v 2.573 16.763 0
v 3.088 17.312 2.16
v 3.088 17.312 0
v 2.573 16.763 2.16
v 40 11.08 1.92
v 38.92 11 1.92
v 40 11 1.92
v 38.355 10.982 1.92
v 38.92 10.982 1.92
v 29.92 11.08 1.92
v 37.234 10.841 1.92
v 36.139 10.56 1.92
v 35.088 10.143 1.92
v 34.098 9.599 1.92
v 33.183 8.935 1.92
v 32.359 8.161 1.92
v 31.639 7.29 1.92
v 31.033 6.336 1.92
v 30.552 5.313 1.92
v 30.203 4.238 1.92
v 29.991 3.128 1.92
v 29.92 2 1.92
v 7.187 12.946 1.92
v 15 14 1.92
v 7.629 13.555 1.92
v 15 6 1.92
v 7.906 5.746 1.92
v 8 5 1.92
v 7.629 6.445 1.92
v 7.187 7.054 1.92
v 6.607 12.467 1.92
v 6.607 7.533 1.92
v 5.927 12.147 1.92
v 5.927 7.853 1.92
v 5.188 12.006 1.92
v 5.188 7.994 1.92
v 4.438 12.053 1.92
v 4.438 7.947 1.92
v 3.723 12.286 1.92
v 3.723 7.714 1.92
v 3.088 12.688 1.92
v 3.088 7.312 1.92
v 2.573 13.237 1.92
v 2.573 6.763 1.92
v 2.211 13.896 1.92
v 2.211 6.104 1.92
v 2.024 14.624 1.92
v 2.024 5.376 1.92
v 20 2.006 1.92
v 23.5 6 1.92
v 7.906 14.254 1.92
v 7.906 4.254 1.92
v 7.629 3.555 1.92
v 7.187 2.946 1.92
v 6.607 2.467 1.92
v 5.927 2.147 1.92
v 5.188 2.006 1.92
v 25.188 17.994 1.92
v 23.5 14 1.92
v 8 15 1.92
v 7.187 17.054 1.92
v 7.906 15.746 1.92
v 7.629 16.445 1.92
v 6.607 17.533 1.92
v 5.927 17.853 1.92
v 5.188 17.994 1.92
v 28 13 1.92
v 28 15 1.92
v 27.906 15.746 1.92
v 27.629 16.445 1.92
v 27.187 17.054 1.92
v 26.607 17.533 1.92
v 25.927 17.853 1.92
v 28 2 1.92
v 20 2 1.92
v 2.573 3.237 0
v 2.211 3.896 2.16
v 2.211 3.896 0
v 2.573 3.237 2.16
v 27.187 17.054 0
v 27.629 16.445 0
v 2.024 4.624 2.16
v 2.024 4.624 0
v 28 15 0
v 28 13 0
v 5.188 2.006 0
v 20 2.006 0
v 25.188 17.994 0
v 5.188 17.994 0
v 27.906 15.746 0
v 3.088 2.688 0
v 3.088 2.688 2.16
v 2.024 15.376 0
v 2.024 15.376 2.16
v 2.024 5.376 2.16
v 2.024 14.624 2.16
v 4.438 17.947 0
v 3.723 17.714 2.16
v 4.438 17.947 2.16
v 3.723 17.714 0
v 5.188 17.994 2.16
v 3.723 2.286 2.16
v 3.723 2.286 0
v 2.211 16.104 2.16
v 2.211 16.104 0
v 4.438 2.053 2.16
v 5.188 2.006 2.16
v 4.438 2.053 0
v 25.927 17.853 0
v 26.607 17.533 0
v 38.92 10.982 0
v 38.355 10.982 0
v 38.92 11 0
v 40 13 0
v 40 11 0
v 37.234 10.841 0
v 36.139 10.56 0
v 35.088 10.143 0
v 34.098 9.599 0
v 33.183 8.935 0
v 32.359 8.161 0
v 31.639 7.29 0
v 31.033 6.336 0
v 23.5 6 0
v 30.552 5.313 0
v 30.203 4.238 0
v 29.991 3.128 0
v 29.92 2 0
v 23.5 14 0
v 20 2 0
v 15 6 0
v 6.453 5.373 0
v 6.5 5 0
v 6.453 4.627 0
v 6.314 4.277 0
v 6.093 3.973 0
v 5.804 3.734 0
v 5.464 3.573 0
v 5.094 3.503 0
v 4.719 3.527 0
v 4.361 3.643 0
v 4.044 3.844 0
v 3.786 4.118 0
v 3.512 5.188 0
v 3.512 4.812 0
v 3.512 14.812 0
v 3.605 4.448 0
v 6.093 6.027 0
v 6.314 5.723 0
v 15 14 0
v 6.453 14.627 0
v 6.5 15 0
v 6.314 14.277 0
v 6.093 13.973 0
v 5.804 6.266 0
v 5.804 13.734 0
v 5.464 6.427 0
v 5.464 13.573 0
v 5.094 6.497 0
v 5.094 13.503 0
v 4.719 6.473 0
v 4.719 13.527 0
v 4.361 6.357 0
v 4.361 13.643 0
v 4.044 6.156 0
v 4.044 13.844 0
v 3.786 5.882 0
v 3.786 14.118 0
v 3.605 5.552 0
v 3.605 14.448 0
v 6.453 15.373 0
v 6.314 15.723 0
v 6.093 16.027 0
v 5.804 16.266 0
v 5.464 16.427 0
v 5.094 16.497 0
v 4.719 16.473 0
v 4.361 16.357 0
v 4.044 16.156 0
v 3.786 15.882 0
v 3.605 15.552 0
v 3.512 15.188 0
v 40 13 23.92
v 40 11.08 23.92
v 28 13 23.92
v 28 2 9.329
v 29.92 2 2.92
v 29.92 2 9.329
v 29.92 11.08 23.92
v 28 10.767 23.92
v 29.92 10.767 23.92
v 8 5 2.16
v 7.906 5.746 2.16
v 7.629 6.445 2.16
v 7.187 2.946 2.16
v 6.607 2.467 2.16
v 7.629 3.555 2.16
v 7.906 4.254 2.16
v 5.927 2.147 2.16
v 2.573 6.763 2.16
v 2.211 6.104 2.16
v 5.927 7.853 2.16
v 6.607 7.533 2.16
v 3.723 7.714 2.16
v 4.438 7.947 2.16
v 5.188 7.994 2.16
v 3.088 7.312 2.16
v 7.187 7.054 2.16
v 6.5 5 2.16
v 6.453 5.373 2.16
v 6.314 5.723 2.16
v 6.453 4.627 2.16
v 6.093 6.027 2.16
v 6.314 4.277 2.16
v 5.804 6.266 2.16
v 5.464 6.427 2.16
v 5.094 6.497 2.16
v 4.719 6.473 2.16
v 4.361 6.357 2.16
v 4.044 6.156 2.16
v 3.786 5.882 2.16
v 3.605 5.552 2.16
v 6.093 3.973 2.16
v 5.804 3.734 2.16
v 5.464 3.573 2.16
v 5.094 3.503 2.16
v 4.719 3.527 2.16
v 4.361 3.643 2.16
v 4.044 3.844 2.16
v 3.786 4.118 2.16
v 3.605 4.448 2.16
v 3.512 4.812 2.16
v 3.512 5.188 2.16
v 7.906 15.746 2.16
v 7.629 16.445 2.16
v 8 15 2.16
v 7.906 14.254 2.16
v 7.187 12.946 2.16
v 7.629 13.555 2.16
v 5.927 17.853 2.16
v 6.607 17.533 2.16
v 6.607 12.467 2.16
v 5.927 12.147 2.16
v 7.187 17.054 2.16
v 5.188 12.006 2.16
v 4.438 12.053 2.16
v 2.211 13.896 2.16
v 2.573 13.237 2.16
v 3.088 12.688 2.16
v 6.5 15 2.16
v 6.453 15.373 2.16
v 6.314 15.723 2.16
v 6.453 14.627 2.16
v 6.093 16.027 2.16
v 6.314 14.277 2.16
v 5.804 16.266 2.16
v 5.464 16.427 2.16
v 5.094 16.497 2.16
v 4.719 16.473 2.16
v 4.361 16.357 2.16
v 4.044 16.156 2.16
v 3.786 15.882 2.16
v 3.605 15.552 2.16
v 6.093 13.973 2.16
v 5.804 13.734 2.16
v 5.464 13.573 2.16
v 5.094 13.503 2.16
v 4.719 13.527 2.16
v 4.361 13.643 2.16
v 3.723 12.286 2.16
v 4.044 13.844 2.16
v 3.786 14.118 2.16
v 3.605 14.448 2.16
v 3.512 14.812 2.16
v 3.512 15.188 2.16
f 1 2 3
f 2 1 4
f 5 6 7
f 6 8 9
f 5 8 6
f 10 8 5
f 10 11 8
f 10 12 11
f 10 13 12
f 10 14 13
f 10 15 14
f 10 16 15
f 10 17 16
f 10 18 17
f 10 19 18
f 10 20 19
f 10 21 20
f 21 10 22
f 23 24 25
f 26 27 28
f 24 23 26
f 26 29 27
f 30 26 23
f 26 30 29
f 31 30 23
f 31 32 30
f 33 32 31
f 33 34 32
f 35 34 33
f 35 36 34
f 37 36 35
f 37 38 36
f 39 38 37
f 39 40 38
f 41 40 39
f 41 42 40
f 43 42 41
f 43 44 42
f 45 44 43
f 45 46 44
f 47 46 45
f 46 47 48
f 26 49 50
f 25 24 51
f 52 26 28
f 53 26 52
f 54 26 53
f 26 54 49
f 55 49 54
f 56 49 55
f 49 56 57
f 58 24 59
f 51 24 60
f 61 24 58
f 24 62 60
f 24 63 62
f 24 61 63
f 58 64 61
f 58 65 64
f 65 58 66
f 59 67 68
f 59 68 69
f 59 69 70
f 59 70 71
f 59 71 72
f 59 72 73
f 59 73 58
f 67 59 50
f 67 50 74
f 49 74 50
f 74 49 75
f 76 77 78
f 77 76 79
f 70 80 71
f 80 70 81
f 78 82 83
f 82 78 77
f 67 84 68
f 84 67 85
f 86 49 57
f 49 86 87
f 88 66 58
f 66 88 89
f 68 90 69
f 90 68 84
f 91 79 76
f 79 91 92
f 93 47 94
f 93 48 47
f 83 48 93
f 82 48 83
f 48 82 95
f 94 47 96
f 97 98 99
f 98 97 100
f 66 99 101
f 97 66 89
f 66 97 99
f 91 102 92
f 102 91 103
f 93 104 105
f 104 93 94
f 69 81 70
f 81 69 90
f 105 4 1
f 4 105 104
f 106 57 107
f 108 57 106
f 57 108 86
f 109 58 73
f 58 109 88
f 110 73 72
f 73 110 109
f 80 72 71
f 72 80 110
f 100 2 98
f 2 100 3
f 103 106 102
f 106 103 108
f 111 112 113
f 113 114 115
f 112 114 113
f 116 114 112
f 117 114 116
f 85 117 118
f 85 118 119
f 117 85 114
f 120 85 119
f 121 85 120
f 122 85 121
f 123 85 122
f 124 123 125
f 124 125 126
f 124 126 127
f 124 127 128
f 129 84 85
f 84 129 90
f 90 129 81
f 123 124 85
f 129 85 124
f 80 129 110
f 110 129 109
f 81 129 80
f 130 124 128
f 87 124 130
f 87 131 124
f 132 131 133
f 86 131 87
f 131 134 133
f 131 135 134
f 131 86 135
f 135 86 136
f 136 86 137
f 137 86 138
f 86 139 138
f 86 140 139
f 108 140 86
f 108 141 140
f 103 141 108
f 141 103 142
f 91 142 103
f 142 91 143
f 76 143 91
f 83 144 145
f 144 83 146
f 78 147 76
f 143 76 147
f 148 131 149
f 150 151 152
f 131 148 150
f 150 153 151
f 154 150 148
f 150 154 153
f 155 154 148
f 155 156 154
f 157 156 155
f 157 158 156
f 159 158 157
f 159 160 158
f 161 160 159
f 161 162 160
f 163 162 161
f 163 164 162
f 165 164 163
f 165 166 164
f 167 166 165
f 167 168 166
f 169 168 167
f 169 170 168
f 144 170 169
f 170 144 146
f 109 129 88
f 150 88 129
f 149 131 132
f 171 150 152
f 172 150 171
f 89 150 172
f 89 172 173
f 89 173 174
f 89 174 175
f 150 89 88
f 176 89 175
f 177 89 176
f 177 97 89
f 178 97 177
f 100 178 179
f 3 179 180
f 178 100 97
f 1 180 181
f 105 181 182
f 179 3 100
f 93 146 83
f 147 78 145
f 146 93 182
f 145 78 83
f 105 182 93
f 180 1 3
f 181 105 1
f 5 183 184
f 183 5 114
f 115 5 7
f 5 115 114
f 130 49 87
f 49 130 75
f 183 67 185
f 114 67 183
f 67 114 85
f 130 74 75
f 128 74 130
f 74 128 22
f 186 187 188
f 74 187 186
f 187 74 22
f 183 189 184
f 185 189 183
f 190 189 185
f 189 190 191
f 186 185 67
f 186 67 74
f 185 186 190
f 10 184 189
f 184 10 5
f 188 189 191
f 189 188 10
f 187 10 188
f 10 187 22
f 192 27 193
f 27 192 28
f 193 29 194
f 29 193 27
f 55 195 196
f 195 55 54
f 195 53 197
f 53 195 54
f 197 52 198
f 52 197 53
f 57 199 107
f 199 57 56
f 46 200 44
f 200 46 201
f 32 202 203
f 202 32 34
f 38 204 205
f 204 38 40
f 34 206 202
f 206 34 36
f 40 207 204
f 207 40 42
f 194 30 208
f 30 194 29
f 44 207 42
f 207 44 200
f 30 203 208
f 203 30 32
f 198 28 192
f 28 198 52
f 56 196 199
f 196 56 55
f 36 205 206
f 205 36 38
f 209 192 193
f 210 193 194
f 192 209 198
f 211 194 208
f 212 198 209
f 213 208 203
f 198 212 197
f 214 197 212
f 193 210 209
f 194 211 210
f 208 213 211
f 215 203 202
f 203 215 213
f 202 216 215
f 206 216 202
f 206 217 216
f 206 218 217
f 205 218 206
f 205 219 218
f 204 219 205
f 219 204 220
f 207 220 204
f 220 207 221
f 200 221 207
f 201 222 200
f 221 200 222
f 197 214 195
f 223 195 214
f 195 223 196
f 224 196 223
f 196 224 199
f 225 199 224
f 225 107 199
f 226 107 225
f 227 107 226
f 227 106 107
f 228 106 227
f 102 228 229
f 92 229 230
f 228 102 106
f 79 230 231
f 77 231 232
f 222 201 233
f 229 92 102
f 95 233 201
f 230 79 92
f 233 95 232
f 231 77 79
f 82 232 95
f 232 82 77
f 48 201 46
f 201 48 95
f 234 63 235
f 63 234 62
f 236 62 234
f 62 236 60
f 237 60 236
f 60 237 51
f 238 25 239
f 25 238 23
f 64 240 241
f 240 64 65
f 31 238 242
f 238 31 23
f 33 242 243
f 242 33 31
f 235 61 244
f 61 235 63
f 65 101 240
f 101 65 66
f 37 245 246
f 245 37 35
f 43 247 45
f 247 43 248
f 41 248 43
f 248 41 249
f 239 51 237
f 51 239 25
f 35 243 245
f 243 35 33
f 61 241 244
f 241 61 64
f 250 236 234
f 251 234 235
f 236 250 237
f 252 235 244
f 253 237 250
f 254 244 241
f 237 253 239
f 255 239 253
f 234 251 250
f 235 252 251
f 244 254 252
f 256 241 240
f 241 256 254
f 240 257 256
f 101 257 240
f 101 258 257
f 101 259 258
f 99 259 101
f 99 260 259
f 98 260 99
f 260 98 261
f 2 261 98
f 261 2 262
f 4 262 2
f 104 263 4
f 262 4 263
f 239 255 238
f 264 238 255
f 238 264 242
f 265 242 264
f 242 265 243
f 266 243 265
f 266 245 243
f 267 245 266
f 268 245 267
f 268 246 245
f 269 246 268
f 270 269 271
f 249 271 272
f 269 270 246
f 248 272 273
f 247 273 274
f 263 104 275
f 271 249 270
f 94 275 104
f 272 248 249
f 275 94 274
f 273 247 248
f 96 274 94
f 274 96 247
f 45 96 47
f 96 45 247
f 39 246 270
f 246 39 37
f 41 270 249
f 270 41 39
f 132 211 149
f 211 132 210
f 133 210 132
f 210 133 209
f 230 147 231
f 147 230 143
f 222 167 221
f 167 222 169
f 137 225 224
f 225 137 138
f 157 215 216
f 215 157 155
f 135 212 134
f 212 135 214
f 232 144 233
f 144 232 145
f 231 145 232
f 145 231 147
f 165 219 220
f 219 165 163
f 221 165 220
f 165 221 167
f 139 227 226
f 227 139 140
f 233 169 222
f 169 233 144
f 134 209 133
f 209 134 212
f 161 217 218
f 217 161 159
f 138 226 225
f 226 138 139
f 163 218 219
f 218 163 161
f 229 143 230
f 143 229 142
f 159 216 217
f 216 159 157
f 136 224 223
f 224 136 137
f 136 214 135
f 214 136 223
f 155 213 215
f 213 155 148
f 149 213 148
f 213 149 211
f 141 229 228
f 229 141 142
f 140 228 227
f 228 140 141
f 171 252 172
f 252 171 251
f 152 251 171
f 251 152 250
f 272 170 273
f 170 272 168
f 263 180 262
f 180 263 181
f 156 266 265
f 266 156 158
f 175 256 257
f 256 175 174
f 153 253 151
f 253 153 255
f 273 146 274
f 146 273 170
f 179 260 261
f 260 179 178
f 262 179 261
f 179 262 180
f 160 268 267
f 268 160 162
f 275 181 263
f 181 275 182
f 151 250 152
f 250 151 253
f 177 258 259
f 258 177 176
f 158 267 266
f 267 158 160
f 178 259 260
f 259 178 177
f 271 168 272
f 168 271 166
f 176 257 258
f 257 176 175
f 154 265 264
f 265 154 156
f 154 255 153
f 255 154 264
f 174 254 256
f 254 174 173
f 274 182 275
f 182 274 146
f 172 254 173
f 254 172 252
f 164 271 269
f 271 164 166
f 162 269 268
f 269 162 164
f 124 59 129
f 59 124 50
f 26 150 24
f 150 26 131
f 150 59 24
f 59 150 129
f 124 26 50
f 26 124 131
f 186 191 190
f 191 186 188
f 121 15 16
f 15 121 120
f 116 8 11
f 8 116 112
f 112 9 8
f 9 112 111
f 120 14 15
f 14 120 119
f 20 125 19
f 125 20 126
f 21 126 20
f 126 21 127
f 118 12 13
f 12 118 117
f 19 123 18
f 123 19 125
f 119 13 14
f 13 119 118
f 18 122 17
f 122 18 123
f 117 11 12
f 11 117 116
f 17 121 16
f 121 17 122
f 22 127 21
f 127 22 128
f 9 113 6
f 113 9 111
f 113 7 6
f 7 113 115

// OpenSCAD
// X-axis homing target for dc42's modulated IR

$fn=25;
thickness = 1.92;
screwPadThickness = 0.24;
padWidth=12;
padOffset = 28;
padHeight=11;
padDepth=22;
overlap=1;


difference() {
	union() {
		translate([15,10,0]) roundedRect([23,13,thickness], 3);
		translate([20,2,0]) cube([padOffset+padWidth-20,padHeight,thickness]);
		translate([padOffset,padHeight+2-thickness,thickness])
			cube([padWidth,thickness,padDepth]);
      	translate([padOffset,2,thickness])
			cube([thickness,padHeight,padDepth]);
		translate([5,5,thickness-overlap]) cylinder(h=screwPadThickness+overlap,r=3);
		translate([5,15,thickness-overlap]) cylinder(h=screwPadThickness+overlap,r=3);
	}
	translate([5,5,-overlap]) cylinder(h=thickness+screwPadThickness+2*overlap,r=1.5);
	translate([5,15,-overlap]) cylinder(h=thickness+screwPadThickness+2*overlap,r=1.5);
	translate([15,6,-overlap]) cube([8.5,8,thickness+2*overlap]);
	translate([padOffset-overlap,0,6])
		rotate([59,0,0]) cube([thickness+2*overlap,30,30]);
	translate([padOffset+thickness+9,2,-overlap]) cylinder(h=thickness+2*overlap,r=9,$fn=50);
	translate([padOffset+thickness+9,0,-overlap]) cube([10,11,thickness+2*overlap]);
}

module roundedRect(size, radius)
{
	x = size[0];
	y = size[1];
	z = size[2];

	linear_extrude(height=z)
	hull()
	{
		// place 4 circles in the corners, with the given radius
		translate([(-x/2)+(radius/2), (-y/2)+(radius/2), 0])
		circle(r=radius);
	
		translate([(x/2)-(radius/2), (-y/2)+(radius/2), 0])
		circle(r=radius);
	
		translate([(-x/2)+(radius/2), (y/2)-(radius/2), 0])
		circle(r=radius);
	
		translate([(x/2)-(radius/2), (y/2)-(radius/2), 0])
		circle(r=radius);
	}
}
